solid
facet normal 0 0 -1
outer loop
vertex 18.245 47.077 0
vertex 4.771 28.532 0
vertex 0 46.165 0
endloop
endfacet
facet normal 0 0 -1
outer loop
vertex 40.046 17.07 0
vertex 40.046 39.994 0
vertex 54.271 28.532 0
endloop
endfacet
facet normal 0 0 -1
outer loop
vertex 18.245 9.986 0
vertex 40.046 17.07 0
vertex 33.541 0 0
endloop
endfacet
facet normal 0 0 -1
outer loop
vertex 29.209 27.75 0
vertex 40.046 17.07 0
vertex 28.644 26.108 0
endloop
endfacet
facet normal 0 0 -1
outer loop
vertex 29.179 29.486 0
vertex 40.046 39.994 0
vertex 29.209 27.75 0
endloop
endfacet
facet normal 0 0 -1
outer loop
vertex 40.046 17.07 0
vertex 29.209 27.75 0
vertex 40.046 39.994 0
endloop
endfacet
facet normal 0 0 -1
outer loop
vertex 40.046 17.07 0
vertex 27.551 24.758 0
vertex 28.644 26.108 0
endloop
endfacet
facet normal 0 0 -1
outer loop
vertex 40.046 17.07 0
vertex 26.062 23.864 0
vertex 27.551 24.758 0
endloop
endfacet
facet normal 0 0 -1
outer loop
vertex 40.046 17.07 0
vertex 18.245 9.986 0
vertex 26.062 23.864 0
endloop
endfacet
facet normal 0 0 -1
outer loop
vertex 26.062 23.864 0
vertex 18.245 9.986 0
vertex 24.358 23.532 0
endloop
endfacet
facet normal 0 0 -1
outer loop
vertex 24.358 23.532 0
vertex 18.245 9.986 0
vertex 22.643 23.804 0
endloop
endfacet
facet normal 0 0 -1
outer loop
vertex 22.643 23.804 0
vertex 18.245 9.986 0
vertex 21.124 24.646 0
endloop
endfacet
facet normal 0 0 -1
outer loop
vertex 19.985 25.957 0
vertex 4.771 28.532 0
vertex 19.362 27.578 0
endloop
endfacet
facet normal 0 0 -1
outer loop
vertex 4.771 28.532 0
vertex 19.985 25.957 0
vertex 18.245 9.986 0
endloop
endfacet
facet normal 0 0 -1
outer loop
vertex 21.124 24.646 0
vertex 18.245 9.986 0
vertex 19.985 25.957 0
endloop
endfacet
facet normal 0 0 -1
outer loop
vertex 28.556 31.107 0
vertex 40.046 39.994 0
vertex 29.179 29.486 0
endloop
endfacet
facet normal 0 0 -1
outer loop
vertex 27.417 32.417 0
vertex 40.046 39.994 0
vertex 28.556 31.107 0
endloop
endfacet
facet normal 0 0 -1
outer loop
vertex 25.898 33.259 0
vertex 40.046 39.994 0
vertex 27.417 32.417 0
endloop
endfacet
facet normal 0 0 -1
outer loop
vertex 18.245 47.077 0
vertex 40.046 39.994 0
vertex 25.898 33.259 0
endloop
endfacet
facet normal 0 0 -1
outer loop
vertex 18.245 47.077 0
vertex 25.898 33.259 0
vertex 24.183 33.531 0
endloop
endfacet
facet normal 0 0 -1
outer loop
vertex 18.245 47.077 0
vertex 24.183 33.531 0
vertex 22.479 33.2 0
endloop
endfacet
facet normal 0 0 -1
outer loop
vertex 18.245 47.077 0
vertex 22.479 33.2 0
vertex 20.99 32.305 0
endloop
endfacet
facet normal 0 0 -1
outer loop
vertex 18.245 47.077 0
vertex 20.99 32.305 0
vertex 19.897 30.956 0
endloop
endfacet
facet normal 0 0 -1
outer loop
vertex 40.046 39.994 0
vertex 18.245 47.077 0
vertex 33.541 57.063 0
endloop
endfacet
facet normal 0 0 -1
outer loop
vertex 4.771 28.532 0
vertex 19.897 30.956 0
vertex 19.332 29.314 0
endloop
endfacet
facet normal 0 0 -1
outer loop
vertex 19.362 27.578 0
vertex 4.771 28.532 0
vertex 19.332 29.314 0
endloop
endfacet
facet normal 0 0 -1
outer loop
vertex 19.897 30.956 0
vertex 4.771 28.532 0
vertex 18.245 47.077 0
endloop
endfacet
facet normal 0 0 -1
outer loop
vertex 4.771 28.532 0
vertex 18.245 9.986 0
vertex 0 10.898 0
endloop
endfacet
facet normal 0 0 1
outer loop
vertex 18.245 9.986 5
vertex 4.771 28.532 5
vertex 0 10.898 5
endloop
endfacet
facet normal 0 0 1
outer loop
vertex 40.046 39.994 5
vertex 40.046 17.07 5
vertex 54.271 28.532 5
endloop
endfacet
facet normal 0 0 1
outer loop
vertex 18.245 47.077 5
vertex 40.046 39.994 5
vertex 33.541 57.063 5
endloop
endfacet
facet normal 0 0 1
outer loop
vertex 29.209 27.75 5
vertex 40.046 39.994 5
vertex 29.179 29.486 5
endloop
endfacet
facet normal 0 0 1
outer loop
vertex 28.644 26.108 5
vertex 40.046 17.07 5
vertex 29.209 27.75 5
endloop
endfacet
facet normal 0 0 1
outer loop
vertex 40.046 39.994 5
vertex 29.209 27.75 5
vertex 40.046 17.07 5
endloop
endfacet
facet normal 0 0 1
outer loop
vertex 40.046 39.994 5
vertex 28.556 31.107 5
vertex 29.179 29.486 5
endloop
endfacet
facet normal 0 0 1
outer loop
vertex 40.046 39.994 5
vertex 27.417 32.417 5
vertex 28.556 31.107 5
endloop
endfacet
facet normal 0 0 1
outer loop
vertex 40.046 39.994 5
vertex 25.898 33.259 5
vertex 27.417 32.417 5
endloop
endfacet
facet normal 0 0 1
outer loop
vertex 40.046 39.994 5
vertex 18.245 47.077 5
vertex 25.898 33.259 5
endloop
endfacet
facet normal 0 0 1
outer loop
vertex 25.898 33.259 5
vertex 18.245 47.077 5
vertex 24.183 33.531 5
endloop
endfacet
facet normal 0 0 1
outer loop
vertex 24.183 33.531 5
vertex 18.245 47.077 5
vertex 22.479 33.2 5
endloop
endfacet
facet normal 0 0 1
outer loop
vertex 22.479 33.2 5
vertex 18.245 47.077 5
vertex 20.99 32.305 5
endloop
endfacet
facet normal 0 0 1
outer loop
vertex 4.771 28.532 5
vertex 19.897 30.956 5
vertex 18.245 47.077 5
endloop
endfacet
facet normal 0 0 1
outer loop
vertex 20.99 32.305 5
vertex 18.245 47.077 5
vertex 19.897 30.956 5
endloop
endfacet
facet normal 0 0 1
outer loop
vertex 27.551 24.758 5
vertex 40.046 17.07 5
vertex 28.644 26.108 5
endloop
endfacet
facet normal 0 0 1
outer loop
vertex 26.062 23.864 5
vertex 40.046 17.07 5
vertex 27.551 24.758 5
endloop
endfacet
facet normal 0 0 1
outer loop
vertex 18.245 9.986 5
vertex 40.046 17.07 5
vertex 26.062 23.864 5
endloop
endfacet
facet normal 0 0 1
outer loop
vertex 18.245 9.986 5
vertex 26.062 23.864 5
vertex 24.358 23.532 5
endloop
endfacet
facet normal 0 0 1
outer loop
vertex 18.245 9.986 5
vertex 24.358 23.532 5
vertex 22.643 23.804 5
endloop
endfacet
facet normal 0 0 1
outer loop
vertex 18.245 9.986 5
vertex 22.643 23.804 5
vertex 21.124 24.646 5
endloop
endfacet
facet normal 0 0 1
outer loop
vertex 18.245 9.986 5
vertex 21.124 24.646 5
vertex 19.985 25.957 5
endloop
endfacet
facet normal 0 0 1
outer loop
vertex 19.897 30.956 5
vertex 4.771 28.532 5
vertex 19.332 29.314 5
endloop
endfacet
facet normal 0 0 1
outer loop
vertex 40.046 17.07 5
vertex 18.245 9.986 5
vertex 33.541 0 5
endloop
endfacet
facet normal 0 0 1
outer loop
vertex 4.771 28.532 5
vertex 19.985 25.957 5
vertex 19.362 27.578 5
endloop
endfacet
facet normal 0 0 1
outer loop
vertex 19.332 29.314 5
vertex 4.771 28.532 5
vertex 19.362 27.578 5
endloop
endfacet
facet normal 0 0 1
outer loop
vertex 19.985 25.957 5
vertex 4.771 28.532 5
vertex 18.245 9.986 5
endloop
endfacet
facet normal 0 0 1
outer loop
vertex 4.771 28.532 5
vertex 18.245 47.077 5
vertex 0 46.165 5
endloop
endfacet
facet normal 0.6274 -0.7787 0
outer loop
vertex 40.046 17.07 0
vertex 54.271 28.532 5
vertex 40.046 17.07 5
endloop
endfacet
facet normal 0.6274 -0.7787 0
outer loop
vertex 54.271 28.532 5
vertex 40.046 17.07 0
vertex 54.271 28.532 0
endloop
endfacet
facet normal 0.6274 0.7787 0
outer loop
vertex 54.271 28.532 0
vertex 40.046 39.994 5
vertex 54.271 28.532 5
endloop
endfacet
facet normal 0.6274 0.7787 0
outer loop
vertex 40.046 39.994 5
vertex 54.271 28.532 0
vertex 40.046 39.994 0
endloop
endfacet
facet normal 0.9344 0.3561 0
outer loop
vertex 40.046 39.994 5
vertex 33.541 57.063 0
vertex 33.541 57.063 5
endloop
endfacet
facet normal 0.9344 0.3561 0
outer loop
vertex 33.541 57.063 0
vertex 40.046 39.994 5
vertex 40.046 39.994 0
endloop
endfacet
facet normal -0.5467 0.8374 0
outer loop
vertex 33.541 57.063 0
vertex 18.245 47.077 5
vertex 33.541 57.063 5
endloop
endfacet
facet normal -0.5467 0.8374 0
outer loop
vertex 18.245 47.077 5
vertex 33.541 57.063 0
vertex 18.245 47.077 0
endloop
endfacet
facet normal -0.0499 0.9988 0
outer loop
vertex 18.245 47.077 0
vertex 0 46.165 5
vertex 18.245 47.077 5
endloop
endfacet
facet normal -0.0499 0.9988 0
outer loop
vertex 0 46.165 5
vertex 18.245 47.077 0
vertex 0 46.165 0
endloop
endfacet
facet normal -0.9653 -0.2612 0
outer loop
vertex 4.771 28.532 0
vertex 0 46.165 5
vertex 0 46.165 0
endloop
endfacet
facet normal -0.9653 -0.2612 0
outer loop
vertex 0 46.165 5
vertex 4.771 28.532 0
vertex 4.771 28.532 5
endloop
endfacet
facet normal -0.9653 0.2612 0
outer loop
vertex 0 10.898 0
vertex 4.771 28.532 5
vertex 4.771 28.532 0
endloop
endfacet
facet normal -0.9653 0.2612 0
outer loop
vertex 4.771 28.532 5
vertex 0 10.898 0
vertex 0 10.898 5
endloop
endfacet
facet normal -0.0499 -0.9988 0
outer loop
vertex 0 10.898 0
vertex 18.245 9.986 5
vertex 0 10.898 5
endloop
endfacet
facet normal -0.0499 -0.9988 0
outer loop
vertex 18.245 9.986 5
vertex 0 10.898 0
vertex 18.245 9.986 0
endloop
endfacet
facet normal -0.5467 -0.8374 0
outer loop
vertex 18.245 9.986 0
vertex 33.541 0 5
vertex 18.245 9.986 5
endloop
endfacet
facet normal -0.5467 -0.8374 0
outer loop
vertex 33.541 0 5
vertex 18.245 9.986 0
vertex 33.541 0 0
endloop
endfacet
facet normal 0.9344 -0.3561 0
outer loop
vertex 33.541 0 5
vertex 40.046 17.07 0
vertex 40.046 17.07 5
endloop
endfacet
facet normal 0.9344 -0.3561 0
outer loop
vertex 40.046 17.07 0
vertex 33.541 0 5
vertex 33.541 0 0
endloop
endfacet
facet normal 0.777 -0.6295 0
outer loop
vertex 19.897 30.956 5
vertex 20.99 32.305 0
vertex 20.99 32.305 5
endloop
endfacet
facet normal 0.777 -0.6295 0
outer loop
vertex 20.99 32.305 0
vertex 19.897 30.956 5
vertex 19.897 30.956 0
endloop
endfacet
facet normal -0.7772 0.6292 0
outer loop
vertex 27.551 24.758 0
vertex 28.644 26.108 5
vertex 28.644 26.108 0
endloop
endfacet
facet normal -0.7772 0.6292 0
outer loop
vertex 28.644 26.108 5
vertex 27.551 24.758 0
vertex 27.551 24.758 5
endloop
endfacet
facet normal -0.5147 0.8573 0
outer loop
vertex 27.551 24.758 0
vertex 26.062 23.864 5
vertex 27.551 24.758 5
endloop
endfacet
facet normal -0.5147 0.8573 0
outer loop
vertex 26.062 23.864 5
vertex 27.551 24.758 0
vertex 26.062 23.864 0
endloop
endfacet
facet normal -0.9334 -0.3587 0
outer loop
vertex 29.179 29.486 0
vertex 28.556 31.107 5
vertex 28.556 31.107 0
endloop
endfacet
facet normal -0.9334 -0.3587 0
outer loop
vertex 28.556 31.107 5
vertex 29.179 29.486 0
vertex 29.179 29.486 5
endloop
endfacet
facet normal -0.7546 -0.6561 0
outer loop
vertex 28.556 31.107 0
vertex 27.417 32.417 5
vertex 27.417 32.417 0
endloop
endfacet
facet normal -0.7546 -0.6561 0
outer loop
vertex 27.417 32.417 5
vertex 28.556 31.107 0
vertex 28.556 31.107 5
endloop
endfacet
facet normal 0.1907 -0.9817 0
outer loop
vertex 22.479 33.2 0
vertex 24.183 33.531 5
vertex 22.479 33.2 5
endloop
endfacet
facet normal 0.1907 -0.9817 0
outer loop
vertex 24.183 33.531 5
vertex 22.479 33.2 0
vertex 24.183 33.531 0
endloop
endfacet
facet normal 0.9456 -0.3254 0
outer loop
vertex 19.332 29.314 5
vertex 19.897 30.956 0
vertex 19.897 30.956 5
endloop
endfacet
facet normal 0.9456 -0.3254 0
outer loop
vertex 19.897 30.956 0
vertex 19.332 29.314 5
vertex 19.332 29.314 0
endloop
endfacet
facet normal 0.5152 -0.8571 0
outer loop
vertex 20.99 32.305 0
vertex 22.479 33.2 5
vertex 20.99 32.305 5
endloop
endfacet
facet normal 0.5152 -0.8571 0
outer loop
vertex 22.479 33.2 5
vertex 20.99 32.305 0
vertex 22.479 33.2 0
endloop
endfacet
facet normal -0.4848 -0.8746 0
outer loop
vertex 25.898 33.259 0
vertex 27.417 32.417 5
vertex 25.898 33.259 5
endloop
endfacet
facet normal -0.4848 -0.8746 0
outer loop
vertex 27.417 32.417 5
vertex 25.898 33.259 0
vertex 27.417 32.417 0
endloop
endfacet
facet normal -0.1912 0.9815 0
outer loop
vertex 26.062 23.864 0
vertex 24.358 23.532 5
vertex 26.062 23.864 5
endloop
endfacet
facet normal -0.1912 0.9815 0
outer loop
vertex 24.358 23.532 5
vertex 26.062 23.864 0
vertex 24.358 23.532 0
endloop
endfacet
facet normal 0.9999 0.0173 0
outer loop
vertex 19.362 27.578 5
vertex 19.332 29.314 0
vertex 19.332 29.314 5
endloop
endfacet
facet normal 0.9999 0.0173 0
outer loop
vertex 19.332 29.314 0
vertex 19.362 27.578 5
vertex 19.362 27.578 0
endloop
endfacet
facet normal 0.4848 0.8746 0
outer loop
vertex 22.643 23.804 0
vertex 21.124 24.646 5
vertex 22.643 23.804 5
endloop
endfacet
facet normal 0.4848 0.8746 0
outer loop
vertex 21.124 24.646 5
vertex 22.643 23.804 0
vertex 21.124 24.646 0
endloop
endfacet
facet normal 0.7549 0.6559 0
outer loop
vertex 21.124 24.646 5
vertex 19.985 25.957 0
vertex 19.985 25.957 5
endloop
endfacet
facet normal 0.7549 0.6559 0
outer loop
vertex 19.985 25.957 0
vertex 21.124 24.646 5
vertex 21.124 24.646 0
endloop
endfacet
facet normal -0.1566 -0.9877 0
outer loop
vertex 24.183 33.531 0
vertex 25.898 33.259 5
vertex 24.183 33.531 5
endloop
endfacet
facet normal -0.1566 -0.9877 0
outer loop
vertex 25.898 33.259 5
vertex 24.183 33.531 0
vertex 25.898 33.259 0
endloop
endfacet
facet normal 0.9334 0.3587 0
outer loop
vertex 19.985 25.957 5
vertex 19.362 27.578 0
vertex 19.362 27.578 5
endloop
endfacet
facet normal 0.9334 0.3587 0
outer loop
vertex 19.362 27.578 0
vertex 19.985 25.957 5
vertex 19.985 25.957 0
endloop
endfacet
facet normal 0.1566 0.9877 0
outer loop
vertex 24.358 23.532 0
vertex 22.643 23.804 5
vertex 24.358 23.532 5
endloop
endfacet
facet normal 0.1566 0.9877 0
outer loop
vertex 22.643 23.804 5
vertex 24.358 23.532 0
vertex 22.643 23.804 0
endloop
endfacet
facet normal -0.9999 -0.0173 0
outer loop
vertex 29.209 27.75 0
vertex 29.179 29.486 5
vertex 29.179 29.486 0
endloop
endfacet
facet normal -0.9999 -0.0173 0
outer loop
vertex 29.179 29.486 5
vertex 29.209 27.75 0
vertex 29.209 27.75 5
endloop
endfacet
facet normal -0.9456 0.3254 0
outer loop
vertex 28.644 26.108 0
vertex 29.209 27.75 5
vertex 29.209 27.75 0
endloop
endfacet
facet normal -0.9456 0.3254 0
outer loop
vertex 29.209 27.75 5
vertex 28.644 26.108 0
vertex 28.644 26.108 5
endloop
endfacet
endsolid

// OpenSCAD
$fn = 32;

// ----------------------------------------------------------------------
// Star wheel: 5-point blunt, R30
// ----------------------------------------------------------------------

// --- parameters (mm) ---
n_points = 5;             // number of points / teeth
r_out = 30;               // tip radius
r_in = 19.5;              // root radius
bore_r = 5;               // centre bore radius
plate_t = 5;              // plate thickness, Z (extrusion height)
bore_d = 10;              // centre bore diameter

profile = [[54.271, 28.532], [40.046, 39.994], [33.541, 57.063], [18.245, 47.077], [0, 46.165], [4.771, 28.532], [0, 10.898], [18.245, 9.986], [33.541, 0], [40.046, 17.07]];  // primary outline, 10 points, counter clockwise
void_1 = [[29.179, 29.486], [28.556, 31.107], [27.417, 32.417], [25.898, 33.259], [24.183, 33.531], [22.479, 33.2], [20.99, 32.305], [19.897, 30.956], [19.332, 29.314], [19.362, 27.578], [19.985, 25.957], [21.124, 24.646], [22.643, 23.804], [24.358, 23.532], [26.062, 23.864], [27.551, 24.758], [28.644, 26.108], [29.209, 27.75]];  // centre bore, 18 points

// --- the one profile operation ---
difference() {
  linear_extrude(height = plate_t) polygon(points = profile);
  translate([0, 0, -1])
    linear_extrude(height = plate_t + 2) polygon(points = void_1);
}
